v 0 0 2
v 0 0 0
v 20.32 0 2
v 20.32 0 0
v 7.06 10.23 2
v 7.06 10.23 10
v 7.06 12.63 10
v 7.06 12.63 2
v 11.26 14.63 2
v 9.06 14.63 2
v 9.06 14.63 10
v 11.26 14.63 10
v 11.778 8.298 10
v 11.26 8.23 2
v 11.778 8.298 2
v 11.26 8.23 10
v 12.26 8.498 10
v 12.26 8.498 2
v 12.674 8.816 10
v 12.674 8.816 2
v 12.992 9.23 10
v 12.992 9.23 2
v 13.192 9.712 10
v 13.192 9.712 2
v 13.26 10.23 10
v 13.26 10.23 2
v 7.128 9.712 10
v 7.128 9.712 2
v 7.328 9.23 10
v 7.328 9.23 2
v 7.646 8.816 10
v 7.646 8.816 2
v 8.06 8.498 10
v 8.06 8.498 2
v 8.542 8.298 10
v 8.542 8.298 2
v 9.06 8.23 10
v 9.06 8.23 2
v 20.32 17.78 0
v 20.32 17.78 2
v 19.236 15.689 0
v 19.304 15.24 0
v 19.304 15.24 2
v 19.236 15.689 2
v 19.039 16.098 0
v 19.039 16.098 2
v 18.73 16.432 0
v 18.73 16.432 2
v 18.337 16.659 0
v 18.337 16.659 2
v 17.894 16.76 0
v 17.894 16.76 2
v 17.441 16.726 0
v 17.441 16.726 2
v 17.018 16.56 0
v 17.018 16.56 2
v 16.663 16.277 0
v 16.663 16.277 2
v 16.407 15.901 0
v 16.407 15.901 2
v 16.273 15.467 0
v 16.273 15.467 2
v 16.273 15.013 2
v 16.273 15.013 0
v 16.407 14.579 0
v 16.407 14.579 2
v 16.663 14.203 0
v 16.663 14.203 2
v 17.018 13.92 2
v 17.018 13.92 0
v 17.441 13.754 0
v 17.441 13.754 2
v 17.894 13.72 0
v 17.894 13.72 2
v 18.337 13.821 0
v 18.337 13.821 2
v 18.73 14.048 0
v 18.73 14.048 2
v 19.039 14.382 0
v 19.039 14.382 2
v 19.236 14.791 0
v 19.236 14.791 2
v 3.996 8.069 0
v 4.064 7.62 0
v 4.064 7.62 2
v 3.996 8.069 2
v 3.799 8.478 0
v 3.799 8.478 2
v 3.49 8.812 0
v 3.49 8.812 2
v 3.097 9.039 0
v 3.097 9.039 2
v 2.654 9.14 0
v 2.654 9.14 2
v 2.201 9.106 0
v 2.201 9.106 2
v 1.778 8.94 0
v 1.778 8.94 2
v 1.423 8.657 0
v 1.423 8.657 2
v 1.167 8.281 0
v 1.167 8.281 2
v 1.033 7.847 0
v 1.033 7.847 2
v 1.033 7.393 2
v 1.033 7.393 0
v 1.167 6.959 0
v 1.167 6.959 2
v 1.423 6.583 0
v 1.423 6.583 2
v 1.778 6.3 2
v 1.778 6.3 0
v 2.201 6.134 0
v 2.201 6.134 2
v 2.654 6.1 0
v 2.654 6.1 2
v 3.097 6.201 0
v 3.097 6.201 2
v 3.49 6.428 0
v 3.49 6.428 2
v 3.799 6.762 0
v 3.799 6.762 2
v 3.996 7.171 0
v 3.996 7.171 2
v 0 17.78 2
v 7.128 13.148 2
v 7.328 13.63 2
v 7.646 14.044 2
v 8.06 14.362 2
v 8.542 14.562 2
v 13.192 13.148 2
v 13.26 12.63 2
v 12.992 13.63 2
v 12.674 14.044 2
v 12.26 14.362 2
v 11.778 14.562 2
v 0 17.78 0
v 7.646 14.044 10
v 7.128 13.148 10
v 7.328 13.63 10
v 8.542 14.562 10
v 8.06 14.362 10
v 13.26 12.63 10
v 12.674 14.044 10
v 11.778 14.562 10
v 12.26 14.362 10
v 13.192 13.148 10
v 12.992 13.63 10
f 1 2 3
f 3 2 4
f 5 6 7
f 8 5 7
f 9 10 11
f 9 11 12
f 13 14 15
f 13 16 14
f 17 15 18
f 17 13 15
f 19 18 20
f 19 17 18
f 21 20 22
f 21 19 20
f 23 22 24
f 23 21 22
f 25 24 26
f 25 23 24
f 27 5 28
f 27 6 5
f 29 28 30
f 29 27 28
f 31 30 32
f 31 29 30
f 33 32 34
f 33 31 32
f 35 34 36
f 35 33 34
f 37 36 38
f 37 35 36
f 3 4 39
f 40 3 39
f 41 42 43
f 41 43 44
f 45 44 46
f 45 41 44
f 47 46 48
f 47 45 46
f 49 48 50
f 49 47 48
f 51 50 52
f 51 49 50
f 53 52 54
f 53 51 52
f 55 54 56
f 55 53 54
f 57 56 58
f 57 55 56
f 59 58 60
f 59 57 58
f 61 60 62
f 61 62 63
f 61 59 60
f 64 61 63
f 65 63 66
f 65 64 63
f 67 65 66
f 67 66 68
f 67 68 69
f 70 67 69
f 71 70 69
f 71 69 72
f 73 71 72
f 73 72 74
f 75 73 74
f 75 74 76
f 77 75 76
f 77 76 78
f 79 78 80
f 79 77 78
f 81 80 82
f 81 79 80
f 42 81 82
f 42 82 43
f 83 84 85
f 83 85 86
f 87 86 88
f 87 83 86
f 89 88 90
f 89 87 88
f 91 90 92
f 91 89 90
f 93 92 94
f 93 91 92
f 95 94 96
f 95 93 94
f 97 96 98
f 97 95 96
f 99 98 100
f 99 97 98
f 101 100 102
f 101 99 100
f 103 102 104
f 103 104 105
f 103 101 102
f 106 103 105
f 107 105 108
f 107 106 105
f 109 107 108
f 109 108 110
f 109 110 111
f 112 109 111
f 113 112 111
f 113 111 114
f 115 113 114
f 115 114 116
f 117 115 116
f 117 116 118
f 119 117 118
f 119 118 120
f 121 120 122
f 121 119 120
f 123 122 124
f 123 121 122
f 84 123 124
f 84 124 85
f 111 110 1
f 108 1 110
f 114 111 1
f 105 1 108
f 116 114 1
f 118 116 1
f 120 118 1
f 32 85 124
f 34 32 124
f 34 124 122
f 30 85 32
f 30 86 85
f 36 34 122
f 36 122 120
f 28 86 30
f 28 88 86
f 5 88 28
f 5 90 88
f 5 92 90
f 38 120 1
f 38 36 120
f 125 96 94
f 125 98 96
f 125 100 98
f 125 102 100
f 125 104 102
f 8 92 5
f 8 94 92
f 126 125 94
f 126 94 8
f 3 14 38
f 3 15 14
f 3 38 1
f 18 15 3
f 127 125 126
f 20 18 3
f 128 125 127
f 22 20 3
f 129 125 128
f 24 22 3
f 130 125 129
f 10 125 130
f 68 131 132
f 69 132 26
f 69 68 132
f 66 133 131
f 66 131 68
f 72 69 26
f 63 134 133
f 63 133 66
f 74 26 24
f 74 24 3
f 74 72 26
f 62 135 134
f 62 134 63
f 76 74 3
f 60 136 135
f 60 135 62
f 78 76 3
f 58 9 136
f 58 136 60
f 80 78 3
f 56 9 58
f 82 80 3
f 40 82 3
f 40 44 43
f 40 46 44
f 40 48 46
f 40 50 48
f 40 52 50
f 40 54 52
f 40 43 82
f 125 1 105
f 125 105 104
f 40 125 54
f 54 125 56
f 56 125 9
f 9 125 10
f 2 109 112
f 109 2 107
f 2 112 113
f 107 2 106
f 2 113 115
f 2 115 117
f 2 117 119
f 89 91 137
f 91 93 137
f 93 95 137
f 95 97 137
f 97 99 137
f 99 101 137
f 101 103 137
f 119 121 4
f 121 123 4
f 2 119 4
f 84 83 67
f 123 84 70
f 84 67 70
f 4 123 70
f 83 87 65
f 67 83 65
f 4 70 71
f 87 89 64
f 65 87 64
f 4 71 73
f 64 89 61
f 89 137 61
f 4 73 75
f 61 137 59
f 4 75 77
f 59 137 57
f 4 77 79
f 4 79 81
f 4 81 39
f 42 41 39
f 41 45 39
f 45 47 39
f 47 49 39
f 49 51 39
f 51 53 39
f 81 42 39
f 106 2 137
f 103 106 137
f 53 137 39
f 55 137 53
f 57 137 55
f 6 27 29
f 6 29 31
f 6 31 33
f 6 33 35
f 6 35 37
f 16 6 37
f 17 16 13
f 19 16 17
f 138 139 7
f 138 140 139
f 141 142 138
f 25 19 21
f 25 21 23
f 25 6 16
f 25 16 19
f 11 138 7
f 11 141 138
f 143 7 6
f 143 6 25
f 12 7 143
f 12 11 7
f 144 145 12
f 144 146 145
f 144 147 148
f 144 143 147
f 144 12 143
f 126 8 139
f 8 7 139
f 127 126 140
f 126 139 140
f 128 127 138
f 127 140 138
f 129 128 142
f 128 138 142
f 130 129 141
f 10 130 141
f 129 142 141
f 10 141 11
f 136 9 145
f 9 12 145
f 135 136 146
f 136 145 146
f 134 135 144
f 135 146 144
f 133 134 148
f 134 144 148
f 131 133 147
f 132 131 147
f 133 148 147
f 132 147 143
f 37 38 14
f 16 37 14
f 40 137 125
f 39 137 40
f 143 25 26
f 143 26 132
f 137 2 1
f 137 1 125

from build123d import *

# Parameters (mm, degrees)
MODEL_W             = 20.32
MODEL_H             = 17.78
MODEL_R             = 1.524
MODEL_W_2           = 6.1999876
MODEL_H_2           = 6.3999872
BOSS_EXTRUDE1_DEPTH = 2
MODEL_3_W           = 6.1999876
MODEL_3_H           = 6.3999872
BOSS_EXTRUDE2_DEPTH = 10
FILLET1_R           = 2


with BuildPart() as part:
    # Model → Boss-Extrude1 (new body)
    with BuildSketch(Plane.XY):
        with Locations((10.16, 8.89)):
            Rectangle(MODEL_W, MODEL_H)
        with Locations((2.54, 7.62)):
            Circle(MODEL_R, mode=Mode.SUBTRACT)
        with Locations((17.78, 15.24)):
            Circle(MODEL_R, mode=Mode.SUBTRACT)
        with Locations((10.16, 11.43)):
            Rectangle(MODEL_W_2, MODEL_H_2, mode=Mode.SUBTRACT)
    extrude(amount=BOSS_EXTRUDE1_DEPTH)

    # Model<3> → Boss-Extrude2 (add)
    with BuildSketch(Plane.XY):
        with Locations((10.16, 11.43)):
            Rectangle(MODEL_3_W, MODEL_3_H)
    extrude(amount=BOSS_EXTRUDE2_DEPTH)

    # Fillet1
    fillet1_edges = [part.edges().sort_by_distance(p)[0] for p in [
        (7.0600062, 14.6299936, 6),
        (7.0600062, 8.2300064, 6),
        (13.2599938, 8.2300064, 6),
        (13.2599938, 14.6299936, 6),
    ]]
    fillet(fillet1_edges, radius=FILLET1_R)


solid = part.part
